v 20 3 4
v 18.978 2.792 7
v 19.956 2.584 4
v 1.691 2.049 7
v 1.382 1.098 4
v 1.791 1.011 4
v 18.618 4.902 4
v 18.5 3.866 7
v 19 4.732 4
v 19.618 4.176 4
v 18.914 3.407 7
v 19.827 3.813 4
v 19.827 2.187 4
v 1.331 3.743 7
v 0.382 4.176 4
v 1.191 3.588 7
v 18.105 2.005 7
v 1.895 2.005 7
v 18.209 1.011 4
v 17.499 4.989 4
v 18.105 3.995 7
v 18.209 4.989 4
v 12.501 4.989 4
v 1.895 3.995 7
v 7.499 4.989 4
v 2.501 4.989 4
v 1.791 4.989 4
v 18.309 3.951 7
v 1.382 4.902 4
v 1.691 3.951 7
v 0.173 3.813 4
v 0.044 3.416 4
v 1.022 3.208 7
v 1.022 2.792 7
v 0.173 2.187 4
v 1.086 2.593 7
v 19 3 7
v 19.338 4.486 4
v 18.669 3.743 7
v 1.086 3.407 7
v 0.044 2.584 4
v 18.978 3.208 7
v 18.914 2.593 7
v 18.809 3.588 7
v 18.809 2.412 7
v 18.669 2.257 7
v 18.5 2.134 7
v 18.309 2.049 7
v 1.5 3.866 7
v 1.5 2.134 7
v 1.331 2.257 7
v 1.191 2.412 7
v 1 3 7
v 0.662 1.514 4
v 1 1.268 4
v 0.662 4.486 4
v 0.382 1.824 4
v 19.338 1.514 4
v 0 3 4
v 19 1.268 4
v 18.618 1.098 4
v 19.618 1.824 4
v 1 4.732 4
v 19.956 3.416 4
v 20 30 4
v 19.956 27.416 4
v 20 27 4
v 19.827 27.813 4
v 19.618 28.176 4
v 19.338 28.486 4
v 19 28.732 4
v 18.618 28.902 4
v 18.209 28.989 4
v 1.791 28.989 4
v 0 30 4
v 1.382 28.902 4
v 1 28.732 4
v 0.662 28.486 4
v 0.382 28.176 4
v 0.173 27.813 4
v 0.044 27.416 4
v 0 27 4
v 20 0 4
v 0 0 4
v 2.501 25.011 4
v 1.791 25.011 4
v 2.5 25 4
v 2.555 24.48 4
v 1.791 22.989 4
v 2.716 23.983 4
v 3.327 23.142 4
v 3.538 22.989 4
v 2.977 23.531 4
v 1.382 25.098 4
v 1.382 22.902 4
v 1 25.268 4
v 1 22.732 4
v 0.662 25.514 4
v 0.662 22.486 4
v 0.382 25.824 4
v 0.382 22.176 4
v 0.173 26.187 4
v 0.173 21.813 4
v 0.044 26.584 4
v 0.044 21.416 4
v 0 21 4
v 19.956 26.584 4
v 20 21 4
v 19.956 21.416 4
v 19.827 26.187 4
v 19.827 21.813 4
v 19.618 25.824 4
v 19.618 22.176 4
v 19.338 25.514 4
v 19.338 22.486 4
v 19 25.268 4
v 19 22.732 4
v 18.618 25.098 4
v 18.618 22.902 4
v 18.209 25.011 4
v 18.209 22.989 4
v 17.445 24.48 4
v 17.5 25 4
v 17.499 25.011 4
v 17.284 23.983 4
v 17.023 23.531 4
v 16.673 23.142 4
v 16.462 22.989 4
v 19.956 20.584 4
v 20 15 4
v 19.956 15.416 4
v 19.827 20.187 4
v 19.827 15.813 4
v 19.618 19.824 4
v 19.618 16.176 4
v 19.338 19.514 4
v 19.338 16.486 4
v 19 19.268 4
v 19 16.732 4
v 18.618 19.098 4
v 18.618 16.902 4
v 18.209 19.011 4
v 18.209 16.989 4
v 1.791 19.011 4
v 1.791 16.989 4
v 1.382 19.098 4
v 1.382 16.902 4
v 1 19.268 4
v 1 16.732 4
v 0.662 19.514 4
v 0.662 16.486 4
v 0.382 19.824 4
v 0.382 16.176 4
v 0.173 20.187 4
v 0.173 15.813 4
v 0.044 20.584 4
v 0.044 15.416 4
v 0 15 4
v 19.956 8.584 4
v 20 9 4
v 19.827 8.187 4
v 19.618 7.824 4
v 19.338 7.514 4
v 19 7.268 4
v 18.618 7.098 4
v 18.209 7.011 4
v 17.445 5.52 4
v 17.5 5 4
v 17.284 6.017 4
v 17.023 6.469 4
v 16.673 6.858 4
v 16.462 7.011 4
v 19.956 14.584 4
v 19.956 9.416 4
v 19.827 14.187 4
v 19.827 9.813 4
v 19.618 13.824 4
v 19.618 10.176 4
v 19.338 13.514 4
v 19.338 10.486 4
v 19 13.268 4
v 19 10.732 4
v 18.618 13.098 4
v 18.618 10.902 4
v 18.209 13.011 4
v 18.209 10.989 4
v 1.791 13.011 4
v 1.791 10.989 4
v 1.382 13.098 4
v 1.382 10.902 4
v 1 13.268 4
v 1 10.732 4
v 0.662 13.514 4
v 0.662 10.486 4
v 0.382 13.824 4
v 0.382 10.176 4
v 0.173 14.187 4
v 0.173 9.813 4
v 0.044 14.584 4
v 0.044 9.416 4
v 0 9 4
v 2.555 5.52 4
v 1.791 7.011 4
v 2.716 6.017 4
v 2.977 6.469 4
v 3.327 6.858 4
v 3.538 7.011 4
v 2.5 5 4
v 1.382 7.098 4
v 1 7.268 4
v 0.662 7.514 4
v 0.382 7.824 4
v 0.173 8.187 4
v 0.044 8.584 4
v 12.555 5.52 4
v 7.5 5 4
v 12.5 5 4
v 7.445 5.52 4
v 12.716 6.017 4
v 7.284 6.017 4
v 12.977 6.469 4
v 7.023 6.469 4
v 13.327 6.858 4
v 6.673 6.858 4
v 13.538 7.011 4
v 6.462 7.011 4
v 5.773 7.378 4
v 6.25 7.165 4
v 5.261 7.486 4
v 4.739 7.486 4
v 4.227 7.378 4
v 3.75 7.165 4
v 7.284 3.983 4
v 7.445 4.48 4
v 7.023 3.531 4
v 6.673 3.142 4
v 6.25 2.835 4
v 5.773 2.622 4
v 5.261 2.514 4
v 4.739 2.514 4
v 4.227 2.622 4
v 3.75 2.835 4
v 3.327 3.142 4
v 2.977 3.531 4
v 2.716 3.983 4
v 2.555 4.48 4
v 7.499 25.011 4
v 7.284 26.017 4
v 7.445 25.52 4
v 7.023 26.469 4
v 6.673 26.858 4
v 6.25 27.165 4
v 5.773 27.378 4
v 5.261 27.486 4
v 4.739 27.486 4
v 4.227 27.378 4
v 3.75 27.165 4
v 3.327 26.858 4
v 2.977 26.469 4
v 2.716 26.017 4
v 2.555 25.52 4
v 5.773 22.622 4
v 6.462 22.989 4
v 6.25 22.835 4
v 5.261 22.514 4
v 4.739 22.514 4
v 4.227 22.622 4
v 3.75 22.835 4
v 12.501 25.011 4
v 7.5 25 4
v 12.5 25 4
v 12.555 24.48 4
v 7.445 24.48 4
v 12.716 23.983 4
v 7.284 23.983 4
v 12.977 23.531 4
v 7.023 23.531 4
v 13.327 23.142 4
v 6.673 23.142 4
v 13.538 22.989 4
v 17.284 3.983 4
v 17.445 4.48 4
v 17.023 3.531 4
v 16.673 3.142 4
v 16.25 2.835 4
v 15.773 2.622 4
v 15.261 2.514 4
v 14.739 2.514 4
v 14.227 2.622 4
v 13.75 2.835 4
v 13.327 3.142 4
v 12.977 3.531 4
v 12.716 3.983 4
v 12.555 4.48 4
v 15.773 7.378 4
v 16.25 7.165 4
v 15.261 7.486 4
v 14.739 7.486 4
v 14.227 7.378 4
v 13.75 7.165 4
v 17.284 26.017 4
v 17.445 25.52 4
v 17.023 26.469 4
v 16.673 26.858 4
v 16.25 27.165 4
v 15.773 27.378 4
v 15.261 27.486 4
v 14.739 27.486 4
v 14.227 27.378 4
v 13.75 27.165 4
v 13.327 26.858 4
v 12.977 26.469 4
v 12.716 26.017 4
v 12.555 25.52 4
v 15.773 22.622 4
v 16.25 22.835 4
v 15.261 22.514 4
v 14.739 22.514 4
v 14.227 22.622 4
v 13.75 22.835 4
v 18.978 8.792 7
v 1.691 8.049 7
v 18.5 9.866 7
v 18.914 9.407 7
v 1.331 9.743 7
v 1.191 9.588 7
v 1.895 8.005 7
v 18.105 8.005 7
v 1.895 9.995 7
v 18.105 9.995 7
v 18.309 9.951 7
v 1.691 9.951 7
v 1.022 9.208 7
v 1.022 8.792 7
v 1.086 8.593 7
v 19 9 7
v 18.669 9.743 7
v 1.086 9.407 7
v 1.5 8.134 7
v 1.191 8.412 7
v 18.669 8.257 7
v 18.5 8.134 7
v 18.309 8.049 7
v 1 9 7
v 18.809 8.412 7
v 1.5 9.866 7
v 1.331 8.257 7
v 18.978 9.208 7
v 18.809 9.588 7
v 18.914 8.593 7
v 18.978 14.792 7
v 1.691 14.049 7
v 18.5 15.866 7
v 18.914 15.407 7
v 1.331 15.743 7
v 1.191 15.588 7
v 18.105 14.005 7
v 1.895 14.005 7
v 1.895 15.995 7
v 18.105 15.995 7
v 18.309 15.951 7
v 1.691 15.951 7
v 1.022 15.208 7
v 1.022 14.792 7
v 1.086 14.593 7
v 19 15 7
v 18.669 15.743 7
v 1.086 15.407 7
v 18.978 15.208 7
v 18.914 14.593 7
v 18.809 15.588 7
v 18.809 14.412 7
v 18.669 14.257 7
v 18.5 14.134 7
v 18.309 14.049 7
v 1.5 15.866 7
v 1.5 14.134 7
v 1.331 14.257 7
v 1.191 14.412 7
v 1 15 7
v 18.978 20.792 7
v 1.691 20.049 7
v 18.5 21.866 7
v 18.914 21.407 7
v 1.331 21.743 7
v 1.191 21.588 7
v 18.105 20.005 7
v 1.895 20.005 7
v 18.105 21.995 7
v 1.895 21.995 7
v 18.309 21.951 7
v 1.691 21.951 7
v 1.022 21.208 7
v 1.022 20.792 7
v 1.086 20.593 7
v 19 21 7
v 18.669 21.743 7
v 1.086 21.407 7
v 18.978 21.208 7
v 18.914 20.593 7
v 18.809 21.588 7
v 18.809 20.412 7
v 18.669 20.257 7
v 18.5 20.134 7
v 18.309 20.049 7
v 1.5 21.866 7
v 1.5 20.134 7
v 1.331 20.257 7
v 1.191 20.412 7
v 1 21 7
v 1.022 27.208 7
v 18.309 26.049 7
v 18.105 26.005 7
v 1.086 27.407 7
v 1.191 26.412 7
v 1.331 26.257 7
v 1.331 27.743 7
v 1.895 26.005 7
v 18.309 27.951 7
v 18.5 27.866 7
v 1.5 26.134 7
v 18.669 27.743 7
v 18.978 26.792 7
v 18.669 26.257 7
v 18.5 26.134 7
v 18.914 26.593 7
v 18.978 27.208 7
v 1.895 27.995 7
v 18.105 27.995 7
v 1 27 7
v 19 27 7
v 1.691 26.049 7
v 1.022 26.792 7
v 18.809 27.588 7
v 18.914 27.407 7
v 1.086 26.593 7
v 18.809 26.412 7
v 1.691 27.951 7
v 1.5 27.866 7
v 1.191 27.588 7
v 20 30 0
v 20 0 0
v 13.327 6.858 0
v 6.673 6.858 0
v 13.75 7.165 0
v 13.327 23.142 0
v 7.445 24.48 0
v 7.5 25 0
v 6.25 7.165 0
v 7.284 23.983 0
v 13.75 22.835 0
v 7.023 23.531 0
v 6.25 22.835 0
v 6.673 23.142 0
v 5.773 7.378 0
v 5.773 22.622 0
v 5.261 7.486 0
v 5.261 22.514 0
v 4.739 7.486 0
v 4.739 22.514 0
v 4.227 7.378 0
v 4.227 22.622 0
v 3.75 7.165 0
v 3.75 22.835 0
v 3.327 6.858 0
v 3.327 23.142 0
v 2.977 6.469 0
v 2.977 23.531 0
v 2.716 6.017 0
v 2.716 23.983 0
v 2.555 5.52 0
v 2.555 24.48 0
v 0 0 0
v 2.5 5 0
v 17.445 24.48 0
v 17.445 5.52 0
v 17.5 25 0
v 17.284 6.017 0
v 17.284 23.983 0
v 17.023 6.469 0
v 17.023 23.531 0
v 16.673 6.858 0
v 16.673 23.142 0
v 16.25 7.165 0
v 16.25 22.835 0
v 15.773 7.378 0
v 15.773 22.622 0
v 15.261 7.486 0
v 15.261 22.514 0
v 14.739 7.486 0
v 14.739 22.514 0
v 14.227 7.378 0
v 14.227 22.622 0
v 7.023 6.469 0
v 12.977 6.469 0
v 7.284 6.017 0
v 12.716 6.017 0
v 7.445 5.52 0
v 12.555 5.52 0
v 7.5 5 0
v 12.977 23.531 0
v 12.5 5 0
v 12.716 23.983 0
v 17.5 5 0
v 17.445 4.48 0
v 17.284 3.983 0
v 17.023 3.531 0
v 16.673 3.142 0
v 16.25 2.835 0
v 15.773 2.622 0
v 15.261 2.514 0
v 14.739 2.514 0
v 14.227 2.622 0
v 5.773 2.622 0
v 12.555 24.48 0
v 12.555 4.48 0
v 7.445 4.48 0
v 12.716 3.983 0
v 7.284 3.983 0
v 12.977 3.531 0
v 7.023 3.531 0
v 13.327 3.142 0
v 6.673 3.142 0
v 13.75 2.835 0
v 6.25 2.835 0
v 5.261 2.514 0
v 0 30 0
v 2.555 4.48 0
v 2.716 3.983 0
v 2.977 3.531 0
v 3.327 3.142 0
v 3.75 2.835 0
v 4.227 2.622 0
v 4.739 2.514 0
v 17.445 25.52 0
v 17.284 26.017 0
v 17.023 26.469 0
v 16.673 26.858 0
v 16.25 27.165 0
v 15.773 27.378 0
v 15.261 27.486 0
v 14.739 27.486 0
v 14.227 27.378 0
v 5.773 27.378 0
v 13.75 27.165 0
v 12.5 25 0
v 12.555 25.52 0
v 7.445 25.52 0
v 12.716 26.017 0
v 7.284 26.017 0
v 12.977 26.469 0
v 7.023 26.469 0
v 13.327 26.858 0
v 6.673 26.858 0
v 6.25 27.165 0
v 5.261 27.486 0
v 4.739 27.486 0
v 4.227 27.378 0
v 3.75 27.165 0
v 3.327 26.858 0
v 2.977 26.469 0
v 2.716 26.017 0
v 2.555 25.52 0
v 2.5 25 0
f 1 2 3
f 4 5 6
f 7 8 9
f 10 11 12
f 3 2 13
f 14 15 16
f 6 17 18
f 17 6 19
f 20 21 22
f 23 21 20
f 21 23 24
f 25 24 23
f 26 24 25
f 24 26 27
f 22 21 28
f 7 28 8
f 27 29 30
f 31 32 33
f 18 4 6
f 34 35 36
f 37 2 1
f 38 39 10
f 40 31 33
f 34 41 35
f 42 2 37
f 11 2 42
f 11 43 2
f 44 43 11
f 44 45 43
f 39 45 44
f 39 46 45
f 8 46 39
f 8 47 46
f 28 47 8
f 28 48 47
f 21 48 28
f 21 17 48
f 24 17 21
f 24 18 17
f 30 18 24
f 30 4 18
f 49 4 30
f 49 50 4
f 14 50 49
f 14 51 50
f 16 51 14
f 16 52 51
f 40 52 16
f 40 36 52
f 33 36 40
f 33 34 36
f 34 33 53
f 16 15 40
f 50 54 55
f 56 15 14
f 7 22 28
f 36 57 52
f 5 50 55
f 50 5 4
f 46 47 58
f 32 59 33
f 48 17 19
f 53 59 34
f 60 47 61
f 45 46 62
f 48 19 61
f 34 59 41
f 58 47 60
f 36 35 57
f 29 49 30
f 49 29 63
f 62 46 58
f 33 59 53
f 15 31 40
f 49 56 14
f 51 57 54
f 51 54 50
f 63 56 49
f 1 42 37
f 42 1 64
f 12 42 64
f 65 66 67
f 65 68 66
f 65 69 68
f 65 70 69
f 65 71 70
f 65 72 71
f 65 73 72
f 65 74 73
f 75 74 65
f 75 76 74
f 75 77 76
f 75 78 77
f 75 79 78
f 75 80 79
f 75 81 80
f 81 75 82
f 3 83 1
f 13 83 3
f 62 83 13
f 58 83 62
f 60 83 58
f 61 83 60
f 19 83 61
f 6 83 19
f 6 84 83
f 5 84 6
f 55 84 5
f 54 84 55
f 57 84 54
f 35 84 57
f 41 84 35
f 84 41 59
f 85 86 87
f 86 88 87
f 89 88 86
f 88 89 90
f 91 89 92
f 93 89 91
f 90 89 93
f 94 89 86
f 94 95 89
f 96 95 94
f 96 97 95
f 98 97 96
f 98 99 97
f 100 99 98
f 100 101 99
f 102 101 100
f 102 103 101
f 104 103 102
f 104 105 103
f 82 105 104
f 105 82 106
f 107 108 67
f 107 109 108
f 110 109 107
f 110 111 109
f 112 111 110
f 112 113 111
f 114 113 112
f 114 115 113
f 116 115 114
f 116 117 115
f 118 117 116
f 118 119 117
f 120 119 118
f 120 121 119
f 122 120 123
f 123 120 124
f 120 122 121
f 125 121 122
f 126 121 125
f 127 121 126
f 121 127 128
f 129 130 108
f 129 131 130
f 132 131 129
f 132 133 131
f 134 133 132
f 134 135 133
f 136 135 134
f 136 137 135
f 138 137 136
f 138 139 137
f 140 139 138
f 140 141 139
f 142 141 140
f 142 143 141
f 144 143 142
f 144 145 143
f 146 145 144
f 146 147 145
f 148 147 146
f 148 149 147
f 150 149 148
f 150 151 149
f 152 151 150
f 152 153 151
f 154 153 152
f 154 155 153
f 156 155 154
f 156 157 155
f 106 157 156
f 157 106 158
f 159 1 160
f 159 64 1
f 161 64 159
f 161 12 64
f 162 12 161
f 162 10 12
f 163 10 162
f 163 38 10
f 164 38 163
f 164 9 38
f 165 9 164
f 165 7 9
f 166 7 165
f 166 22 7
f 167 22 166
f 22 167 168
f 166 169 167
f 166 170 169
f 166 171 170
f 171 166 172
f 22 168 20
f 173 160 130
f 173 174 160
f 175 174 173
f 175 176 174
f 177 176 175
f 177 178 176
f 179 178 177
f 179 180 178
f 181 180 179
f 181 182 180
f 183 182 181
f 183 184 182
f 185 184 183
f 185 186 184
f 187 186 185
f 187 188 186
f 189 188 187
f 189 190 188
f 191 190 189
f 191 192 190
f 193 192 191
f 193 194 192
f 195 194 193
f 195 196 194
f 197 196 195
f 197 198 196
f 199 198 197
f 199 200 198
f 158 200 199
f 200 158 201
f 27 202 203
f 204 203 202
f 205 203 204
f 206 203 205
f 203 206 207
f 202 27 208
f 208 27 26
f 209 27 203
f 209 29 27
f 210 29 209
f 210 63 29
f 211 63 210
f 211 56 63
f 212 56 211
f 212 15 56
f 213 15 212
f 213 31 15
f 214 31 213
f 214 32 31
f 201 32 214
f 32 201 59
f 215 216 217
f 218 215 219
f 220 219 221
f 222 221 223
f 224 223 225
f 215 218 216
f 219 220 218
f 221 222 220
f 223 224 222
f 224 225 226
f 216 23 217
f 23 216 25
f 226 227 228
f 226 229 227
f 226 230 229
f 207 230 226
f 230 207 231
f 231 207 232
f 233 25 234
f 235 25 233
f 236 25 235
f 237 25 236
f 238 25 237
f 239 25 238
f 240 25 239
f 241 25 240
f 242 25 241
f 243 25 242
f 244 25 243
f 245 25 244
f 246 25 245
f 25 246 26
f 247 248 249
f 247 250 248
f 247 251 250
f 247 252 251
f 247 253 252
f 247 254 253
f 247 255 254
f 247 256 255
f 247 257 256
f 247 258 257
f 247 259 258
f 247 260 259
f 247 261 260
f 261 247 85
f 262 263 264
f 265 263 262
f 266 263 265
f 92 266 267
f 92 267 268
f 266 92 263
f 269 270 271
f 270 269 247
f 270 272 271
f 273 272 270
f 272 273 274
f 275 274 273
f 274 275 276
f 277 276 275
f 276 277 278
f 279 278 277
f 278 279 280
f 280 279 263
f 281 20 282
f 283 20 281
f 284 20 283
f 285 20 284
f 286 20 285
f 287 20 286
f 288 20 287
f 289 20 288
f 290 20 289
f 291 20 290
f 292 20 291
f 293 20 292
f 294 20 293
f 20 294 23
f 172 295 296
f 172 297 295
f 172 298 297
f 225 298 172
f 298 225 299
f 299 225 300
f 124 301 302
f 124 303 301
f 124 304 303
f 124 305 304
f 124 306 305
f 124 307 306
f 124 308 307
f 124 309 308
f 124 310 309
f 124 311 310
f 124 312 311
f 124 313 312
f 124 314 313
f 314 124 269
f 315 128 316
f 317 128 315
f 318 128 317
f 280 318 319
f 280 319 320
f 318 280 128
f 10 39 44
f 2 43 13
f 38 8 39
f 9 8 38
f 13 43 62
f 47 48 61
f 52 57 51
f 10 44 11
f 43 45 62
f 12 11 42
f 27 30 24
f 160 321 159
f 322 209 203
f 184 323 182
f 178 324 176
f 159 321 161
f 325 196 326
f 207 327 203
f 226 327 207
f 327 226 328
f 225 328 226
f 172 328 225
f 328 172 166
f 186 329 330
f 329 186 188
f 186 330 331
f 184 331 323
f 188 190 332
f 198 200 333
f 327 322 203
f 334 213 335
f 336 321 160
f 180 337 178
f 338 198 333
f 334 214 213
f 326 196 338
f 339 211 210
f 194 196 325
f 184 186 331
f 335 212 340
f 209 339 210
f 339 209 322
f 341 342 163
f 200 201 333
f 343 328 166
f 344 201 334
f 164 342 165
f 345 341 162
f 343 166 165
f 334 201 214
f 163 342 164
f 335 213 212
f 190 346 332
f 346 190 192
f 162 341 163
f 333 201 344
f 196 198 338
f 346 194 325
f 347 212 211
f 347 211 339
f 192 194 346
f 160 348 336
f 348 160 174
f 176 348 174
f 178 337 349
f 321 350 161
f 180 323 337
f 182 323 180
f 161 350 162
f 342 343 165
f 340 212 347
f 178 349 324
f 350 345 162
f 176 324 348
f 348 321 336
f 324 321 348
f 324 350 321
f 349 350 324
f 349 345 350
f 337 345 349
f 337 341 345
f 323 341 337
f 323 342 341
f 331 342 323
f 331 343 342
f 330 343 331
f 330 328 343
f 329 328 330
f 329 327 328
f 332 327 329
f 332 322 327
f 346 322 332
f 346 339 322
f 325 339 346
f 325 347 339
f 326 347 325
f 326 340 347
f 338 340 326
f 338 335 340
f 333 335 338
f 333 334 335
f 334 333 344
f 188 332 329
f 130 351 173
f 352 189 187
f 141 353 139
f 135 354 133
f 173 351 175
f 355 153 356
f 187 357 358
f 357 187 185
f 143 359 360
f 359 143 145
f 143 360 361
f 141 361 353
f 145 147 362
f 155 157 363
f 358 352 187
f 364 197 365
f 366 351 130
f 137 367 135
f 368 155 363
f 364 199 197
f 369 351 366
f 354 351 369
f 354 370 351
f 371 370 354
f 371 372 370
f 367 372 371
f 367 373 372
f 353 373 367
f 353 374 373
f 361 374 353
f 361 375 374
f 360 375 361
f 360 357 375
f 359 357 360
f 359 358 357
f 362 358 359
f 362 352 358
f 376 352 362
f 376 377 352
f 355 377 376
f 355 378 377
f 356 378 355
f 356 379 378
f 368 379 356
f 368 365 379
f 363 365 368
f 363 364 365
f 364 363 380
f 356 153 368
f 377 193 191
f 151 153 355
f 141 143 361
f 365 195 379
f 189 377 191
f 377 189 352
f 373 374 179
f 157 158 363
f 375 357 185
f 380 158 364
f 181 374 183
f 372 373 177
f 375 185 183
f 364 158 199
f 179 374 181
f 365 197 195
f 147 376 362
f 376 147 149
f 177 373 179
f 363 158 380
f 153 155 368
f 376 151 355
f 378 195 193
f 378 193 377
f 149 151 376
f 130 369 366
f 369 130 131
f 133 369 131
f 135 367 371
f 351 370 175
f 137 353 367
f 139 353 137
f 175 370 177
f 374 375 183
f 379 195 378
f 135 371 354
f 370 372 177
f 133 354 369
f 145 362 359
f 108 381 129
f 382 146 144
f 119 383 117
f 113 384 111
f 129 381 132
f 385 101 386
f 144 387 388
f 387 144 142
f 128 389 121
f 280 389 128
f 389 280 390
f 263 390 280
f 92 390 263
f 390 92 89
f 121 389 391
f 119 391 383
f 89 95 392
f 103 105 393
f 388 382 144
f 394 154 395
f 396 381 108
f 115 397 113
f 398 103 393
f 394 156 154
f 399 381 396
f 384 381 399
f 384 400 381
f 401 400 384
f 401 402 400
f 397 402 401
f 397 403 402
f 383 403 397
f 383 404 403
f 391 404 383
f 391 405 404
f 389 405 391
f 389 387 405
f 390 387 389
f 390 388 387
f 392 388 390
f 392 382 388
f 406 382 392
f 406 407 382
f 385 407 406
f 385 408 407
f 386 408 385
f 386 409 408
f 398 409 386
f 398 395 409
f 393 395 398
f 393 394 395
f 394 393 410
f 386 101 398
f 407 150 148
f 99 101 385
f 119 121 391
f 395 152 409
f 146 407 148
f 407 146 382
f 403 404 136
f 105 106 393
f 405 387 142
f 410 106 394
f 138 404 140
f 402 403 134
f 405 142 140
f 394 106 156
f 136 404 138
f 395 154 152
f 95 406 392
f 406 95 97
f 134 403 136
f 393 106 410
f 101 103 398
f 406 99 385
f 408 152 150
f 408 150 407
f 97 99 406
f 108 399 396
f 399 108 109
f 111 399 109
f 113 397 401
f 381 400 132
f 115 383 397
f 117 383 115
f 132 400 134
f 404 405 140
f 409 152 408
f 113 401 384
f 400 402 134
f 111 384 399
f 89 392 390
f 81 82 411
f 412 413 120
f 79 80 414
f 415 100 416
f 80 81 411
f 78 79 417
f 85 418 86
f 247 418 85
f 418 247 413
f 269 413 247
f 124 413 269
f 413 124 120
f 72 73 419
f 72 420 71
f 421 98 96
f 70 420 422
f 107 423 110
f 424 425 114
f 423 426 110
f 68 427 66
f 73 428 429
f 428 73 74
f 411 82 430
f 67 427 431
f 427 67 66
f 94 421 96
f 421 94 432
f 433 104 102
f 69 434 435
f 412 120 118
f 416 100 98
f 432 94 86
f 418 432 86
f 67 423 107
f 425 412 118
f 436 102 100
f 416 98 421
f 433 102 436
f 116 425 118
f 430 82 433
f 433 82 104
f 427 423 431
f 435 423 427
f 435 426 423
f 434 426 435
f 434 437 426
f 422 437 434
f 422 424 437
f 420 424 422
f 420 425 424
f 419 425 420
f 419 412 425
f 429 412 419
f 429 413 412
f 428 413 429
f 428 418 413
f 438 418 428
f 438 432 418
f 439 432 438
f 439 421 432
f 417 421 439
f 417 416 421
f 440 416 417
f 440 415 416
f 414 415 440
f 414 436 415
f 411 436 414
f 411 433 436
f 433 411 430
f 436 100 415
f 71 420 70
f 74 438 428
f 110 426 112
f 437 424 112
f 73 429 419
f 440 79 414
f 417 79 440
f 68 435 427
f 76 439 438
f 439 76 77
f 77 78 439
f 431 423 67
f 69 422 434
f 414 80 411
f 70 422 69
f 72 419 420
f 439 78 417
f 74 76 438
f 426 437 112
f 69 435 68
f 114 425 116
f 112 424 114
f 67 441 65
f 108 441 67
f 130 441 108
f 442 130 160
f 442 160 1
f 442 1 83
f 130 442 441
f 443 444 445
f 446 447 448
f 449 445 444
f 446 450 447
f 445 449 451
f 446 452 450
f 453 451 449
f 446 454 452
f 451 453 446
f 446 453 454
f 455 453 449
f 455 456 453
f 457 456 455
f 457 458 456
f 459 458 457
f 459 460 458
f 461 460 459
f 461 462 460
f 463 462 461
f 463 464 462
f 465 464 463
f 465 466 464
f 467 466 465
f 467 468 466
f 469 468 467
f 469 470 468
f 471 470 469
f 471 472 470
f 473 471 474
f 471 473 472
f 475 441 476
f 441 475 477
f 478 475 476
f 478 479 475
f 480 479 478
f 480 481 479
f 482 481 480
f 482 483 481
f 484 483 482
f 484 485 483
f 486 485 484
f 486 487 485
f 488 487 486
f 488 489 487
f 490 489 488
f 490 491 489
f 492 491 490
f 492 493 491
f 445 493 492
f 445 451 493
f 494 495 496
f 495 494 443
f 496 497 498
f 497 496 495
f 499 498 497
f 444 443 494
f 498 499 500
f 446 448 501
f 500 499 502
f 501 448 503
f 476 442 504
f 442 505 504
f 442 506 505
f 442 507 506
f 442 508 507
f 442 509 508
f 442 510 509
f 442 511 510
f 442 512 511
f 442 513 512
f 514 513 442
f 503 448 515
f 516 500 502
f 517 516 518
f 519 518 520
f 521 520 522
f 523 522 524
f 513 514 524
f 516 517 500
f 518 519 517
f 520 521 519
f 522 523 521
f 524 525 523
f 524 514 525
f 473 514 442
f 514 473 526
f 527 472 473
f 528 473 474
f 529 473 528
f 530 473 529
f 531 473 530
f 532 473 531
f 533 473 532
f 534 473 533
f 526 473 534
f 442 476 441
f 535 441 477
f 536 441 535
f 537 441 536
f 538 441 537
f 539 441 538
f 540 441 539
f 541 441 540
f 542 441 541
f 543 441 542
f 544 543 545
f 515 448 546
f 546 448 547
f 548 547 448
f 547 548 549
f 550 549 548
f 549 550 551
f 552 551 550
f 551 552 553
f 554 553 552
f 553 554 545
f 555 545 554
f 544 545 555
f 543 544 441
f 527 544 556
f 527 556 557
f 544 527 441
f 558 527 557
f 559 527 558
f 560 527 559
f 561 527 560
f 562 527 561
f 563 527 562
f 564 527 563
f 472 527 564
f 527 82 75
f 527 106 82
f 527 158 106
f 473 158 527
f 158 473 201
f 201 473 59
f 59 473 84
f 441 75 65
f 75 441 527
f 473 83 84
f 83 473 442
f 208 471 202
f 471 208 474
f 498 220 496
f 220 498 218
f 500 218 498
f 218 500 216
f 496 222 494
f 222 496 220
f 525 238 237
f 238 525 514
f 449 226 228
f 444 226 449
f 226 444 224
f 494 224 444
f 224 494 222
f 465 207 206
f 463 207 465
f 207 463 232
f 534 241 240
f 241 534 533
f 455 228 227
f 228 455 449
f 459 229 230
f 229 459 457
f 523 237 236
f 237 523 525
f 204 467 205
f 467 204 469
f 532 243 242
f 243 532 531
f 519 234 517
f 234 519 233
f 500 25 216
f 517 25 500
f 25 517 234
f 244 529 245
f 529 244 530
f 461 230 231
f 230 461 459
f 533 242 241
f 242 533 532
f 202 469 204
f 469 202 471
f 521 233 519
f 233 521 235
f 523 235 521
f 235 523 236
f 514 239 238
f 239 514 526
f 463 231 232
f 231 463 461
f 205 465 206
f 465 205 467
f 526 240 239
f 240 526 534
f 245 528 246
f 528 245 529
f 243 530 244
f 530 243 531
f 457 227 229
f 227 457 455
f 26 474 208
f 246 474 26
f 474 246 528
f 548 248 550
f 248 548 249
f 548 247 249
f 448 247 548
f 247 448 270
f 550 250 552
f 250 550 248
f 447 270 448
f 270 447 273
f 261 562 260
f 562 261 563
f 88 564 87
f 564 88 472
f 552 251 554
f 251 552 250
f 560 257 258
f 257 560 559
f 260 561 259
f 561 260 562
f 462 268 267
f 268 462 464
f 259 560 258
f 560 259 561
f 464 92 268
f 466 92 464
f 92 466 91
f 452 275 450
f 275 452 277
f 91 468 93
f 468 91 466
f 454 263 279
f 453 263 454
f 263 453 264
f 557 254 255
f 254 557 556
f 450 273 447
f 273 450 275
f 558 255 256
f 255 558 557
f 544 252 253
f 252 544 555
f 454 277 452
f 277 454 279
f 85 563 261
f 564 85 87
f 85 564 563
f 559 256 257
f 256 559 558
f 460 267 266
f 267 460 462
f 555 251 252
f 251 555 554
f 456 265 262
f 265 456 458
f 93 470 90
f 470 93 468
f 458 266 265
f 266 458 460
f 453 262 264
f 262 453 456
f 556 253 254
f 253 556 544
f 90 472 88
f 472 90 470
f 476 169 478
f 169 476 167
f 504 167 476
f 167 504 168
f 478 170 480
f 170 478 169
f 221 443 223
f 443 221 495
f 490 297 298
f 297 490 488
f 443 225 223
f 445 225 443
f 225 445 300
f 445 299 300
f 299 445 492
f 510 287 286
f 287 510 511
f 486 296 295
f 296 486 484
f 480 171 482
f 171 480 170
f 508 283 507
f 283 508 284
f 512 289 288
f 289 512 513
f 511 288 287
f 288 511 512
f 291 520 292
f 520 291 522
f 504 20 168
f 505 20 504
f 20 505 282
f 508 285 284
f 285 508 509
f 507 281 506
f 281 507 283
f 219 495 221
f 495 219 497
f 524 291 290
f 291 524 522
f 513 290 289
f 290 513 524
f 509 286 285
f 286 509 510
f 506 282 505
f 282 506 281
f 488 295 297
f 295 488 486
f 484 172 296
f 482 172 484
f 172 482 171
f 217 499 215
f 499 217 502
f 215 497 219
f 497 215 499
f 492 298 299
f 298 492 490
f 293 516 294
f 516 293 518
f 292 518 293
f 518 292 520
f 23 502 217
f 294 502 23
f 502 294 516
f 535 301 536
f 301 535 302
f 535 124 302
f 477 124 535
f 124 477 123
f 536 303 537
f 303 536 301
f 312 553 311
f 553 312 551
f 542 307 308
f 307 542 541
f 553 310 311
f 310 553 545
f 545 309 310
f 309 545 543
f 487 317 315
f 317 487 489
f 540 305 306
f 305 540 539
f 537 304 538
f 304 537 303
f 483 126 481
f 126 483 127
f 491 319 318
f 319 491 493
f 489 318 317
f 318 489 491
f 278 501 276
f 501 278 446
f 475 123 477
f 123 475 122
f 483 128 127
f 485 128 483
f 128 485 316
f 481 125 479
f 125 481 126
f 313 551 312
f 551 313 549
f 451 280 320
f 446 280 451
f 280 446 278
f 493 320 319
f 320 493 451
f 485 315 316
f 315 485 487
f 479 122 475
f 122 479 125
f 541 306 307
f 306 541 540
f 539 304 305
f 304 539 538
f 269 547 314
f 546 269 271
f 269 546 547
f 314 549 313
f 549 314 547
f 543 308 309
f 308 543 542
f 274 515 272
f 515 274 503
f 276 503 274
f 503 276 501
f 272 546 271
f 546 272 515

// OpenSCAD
RAIL_TOP_WIDTH = 2;
RAIL_BOT_WIDTH = 4;
RAIL_SPACING = RAIL_BOT_WIDTH + 2;
RAIL_DEPTH = 3;
RAIL_CORNER_DIA = 8;

HEIGHT = 5 * RAIL_SPACING;
WIDTH = 20;
THICKNESS = 4;

MOUNT_HOLES = true;
MOUNT_HOLE_DIA = 5;
MOUNT_HOLE_OFFSET = 5;

FAN = WIDTH > 120 && HEIGHT > 120;
FAN_MOUNT_SPACING = 105;
FAN_MOUNT_DIA = 5;
FAN_DIA = 120;

///

N_RAILS = floor(HEIGHT / RAIL_SPACING);


$fn = 30;

module rails() {
  off = RAIL_SPACING/2 + ((HEIGHT / RAIL_SPACING) - N_RAILS) * RAIL_SPACING/2;
  for(i = [0:HEIGHT/RAIL_SPACING-1]) {
    translate([RAIL_BOT_WIDTH/2, i * RAIL_SPACING + off, THICKNESS])
    hull() {
      cylinder(d1 = RAIL_BOT_WIDTH, d2 = RAIL_TOP_WIDTH, h = RAIL_DEPTH);
      translate([WIDTH - RAIL_BOT_WIDTH, 0, 0])
      cylinder(d1 = RAIL_BOT_WIDTH, d2 = RAIL_TOP_WIDTH, h = RAIL_DEPTH);
    }
  }
}

module base() {
  cube(size = [WIDTH, HEIGHT, THICKNESS]);
}

module fan() {
  union() {
    cylinder(d = FAN_DIA, h = THICKNESS + RAIL_DEPTH);
    for(i = [-1, 1]) {
      for(j = [-1, 1]) {
        translate([i * FAN_MOUNT_SPACING/2, j * FAN_MOUNT_SPACING/2, 0])
        cylinder(d = FAN_MOUNT_DIA, h = THICKNESS);
      }
    }
  }
}

module mount_holes() {
  translate([WIDTH/2, HEIGHT/2, 0])
  for(i = [-1, 1]) {
    for(j = [-1, 1]) {
      translate([i * (WIDTH - MOUNT_HOLE_OFFSET - MOUNT_HOLE_DIA)/2, j * (HEIGHT - MOUNT_HOLE_OFFSET - MOUNT_HOLE_DIA)/2, 0])
      cylinder(d = MOUNT_HOLE_DIA, h = THICKNESS);
    }
  }
}


difference() {
  union() {
    rails();
    base();
  }

  if(MOUNT_HOLES) {
    mount_holes();
  }
  if(FAN) {
    translate([WIDTH/2, HEIGHT/2, 0])
    fan();
  }
}
